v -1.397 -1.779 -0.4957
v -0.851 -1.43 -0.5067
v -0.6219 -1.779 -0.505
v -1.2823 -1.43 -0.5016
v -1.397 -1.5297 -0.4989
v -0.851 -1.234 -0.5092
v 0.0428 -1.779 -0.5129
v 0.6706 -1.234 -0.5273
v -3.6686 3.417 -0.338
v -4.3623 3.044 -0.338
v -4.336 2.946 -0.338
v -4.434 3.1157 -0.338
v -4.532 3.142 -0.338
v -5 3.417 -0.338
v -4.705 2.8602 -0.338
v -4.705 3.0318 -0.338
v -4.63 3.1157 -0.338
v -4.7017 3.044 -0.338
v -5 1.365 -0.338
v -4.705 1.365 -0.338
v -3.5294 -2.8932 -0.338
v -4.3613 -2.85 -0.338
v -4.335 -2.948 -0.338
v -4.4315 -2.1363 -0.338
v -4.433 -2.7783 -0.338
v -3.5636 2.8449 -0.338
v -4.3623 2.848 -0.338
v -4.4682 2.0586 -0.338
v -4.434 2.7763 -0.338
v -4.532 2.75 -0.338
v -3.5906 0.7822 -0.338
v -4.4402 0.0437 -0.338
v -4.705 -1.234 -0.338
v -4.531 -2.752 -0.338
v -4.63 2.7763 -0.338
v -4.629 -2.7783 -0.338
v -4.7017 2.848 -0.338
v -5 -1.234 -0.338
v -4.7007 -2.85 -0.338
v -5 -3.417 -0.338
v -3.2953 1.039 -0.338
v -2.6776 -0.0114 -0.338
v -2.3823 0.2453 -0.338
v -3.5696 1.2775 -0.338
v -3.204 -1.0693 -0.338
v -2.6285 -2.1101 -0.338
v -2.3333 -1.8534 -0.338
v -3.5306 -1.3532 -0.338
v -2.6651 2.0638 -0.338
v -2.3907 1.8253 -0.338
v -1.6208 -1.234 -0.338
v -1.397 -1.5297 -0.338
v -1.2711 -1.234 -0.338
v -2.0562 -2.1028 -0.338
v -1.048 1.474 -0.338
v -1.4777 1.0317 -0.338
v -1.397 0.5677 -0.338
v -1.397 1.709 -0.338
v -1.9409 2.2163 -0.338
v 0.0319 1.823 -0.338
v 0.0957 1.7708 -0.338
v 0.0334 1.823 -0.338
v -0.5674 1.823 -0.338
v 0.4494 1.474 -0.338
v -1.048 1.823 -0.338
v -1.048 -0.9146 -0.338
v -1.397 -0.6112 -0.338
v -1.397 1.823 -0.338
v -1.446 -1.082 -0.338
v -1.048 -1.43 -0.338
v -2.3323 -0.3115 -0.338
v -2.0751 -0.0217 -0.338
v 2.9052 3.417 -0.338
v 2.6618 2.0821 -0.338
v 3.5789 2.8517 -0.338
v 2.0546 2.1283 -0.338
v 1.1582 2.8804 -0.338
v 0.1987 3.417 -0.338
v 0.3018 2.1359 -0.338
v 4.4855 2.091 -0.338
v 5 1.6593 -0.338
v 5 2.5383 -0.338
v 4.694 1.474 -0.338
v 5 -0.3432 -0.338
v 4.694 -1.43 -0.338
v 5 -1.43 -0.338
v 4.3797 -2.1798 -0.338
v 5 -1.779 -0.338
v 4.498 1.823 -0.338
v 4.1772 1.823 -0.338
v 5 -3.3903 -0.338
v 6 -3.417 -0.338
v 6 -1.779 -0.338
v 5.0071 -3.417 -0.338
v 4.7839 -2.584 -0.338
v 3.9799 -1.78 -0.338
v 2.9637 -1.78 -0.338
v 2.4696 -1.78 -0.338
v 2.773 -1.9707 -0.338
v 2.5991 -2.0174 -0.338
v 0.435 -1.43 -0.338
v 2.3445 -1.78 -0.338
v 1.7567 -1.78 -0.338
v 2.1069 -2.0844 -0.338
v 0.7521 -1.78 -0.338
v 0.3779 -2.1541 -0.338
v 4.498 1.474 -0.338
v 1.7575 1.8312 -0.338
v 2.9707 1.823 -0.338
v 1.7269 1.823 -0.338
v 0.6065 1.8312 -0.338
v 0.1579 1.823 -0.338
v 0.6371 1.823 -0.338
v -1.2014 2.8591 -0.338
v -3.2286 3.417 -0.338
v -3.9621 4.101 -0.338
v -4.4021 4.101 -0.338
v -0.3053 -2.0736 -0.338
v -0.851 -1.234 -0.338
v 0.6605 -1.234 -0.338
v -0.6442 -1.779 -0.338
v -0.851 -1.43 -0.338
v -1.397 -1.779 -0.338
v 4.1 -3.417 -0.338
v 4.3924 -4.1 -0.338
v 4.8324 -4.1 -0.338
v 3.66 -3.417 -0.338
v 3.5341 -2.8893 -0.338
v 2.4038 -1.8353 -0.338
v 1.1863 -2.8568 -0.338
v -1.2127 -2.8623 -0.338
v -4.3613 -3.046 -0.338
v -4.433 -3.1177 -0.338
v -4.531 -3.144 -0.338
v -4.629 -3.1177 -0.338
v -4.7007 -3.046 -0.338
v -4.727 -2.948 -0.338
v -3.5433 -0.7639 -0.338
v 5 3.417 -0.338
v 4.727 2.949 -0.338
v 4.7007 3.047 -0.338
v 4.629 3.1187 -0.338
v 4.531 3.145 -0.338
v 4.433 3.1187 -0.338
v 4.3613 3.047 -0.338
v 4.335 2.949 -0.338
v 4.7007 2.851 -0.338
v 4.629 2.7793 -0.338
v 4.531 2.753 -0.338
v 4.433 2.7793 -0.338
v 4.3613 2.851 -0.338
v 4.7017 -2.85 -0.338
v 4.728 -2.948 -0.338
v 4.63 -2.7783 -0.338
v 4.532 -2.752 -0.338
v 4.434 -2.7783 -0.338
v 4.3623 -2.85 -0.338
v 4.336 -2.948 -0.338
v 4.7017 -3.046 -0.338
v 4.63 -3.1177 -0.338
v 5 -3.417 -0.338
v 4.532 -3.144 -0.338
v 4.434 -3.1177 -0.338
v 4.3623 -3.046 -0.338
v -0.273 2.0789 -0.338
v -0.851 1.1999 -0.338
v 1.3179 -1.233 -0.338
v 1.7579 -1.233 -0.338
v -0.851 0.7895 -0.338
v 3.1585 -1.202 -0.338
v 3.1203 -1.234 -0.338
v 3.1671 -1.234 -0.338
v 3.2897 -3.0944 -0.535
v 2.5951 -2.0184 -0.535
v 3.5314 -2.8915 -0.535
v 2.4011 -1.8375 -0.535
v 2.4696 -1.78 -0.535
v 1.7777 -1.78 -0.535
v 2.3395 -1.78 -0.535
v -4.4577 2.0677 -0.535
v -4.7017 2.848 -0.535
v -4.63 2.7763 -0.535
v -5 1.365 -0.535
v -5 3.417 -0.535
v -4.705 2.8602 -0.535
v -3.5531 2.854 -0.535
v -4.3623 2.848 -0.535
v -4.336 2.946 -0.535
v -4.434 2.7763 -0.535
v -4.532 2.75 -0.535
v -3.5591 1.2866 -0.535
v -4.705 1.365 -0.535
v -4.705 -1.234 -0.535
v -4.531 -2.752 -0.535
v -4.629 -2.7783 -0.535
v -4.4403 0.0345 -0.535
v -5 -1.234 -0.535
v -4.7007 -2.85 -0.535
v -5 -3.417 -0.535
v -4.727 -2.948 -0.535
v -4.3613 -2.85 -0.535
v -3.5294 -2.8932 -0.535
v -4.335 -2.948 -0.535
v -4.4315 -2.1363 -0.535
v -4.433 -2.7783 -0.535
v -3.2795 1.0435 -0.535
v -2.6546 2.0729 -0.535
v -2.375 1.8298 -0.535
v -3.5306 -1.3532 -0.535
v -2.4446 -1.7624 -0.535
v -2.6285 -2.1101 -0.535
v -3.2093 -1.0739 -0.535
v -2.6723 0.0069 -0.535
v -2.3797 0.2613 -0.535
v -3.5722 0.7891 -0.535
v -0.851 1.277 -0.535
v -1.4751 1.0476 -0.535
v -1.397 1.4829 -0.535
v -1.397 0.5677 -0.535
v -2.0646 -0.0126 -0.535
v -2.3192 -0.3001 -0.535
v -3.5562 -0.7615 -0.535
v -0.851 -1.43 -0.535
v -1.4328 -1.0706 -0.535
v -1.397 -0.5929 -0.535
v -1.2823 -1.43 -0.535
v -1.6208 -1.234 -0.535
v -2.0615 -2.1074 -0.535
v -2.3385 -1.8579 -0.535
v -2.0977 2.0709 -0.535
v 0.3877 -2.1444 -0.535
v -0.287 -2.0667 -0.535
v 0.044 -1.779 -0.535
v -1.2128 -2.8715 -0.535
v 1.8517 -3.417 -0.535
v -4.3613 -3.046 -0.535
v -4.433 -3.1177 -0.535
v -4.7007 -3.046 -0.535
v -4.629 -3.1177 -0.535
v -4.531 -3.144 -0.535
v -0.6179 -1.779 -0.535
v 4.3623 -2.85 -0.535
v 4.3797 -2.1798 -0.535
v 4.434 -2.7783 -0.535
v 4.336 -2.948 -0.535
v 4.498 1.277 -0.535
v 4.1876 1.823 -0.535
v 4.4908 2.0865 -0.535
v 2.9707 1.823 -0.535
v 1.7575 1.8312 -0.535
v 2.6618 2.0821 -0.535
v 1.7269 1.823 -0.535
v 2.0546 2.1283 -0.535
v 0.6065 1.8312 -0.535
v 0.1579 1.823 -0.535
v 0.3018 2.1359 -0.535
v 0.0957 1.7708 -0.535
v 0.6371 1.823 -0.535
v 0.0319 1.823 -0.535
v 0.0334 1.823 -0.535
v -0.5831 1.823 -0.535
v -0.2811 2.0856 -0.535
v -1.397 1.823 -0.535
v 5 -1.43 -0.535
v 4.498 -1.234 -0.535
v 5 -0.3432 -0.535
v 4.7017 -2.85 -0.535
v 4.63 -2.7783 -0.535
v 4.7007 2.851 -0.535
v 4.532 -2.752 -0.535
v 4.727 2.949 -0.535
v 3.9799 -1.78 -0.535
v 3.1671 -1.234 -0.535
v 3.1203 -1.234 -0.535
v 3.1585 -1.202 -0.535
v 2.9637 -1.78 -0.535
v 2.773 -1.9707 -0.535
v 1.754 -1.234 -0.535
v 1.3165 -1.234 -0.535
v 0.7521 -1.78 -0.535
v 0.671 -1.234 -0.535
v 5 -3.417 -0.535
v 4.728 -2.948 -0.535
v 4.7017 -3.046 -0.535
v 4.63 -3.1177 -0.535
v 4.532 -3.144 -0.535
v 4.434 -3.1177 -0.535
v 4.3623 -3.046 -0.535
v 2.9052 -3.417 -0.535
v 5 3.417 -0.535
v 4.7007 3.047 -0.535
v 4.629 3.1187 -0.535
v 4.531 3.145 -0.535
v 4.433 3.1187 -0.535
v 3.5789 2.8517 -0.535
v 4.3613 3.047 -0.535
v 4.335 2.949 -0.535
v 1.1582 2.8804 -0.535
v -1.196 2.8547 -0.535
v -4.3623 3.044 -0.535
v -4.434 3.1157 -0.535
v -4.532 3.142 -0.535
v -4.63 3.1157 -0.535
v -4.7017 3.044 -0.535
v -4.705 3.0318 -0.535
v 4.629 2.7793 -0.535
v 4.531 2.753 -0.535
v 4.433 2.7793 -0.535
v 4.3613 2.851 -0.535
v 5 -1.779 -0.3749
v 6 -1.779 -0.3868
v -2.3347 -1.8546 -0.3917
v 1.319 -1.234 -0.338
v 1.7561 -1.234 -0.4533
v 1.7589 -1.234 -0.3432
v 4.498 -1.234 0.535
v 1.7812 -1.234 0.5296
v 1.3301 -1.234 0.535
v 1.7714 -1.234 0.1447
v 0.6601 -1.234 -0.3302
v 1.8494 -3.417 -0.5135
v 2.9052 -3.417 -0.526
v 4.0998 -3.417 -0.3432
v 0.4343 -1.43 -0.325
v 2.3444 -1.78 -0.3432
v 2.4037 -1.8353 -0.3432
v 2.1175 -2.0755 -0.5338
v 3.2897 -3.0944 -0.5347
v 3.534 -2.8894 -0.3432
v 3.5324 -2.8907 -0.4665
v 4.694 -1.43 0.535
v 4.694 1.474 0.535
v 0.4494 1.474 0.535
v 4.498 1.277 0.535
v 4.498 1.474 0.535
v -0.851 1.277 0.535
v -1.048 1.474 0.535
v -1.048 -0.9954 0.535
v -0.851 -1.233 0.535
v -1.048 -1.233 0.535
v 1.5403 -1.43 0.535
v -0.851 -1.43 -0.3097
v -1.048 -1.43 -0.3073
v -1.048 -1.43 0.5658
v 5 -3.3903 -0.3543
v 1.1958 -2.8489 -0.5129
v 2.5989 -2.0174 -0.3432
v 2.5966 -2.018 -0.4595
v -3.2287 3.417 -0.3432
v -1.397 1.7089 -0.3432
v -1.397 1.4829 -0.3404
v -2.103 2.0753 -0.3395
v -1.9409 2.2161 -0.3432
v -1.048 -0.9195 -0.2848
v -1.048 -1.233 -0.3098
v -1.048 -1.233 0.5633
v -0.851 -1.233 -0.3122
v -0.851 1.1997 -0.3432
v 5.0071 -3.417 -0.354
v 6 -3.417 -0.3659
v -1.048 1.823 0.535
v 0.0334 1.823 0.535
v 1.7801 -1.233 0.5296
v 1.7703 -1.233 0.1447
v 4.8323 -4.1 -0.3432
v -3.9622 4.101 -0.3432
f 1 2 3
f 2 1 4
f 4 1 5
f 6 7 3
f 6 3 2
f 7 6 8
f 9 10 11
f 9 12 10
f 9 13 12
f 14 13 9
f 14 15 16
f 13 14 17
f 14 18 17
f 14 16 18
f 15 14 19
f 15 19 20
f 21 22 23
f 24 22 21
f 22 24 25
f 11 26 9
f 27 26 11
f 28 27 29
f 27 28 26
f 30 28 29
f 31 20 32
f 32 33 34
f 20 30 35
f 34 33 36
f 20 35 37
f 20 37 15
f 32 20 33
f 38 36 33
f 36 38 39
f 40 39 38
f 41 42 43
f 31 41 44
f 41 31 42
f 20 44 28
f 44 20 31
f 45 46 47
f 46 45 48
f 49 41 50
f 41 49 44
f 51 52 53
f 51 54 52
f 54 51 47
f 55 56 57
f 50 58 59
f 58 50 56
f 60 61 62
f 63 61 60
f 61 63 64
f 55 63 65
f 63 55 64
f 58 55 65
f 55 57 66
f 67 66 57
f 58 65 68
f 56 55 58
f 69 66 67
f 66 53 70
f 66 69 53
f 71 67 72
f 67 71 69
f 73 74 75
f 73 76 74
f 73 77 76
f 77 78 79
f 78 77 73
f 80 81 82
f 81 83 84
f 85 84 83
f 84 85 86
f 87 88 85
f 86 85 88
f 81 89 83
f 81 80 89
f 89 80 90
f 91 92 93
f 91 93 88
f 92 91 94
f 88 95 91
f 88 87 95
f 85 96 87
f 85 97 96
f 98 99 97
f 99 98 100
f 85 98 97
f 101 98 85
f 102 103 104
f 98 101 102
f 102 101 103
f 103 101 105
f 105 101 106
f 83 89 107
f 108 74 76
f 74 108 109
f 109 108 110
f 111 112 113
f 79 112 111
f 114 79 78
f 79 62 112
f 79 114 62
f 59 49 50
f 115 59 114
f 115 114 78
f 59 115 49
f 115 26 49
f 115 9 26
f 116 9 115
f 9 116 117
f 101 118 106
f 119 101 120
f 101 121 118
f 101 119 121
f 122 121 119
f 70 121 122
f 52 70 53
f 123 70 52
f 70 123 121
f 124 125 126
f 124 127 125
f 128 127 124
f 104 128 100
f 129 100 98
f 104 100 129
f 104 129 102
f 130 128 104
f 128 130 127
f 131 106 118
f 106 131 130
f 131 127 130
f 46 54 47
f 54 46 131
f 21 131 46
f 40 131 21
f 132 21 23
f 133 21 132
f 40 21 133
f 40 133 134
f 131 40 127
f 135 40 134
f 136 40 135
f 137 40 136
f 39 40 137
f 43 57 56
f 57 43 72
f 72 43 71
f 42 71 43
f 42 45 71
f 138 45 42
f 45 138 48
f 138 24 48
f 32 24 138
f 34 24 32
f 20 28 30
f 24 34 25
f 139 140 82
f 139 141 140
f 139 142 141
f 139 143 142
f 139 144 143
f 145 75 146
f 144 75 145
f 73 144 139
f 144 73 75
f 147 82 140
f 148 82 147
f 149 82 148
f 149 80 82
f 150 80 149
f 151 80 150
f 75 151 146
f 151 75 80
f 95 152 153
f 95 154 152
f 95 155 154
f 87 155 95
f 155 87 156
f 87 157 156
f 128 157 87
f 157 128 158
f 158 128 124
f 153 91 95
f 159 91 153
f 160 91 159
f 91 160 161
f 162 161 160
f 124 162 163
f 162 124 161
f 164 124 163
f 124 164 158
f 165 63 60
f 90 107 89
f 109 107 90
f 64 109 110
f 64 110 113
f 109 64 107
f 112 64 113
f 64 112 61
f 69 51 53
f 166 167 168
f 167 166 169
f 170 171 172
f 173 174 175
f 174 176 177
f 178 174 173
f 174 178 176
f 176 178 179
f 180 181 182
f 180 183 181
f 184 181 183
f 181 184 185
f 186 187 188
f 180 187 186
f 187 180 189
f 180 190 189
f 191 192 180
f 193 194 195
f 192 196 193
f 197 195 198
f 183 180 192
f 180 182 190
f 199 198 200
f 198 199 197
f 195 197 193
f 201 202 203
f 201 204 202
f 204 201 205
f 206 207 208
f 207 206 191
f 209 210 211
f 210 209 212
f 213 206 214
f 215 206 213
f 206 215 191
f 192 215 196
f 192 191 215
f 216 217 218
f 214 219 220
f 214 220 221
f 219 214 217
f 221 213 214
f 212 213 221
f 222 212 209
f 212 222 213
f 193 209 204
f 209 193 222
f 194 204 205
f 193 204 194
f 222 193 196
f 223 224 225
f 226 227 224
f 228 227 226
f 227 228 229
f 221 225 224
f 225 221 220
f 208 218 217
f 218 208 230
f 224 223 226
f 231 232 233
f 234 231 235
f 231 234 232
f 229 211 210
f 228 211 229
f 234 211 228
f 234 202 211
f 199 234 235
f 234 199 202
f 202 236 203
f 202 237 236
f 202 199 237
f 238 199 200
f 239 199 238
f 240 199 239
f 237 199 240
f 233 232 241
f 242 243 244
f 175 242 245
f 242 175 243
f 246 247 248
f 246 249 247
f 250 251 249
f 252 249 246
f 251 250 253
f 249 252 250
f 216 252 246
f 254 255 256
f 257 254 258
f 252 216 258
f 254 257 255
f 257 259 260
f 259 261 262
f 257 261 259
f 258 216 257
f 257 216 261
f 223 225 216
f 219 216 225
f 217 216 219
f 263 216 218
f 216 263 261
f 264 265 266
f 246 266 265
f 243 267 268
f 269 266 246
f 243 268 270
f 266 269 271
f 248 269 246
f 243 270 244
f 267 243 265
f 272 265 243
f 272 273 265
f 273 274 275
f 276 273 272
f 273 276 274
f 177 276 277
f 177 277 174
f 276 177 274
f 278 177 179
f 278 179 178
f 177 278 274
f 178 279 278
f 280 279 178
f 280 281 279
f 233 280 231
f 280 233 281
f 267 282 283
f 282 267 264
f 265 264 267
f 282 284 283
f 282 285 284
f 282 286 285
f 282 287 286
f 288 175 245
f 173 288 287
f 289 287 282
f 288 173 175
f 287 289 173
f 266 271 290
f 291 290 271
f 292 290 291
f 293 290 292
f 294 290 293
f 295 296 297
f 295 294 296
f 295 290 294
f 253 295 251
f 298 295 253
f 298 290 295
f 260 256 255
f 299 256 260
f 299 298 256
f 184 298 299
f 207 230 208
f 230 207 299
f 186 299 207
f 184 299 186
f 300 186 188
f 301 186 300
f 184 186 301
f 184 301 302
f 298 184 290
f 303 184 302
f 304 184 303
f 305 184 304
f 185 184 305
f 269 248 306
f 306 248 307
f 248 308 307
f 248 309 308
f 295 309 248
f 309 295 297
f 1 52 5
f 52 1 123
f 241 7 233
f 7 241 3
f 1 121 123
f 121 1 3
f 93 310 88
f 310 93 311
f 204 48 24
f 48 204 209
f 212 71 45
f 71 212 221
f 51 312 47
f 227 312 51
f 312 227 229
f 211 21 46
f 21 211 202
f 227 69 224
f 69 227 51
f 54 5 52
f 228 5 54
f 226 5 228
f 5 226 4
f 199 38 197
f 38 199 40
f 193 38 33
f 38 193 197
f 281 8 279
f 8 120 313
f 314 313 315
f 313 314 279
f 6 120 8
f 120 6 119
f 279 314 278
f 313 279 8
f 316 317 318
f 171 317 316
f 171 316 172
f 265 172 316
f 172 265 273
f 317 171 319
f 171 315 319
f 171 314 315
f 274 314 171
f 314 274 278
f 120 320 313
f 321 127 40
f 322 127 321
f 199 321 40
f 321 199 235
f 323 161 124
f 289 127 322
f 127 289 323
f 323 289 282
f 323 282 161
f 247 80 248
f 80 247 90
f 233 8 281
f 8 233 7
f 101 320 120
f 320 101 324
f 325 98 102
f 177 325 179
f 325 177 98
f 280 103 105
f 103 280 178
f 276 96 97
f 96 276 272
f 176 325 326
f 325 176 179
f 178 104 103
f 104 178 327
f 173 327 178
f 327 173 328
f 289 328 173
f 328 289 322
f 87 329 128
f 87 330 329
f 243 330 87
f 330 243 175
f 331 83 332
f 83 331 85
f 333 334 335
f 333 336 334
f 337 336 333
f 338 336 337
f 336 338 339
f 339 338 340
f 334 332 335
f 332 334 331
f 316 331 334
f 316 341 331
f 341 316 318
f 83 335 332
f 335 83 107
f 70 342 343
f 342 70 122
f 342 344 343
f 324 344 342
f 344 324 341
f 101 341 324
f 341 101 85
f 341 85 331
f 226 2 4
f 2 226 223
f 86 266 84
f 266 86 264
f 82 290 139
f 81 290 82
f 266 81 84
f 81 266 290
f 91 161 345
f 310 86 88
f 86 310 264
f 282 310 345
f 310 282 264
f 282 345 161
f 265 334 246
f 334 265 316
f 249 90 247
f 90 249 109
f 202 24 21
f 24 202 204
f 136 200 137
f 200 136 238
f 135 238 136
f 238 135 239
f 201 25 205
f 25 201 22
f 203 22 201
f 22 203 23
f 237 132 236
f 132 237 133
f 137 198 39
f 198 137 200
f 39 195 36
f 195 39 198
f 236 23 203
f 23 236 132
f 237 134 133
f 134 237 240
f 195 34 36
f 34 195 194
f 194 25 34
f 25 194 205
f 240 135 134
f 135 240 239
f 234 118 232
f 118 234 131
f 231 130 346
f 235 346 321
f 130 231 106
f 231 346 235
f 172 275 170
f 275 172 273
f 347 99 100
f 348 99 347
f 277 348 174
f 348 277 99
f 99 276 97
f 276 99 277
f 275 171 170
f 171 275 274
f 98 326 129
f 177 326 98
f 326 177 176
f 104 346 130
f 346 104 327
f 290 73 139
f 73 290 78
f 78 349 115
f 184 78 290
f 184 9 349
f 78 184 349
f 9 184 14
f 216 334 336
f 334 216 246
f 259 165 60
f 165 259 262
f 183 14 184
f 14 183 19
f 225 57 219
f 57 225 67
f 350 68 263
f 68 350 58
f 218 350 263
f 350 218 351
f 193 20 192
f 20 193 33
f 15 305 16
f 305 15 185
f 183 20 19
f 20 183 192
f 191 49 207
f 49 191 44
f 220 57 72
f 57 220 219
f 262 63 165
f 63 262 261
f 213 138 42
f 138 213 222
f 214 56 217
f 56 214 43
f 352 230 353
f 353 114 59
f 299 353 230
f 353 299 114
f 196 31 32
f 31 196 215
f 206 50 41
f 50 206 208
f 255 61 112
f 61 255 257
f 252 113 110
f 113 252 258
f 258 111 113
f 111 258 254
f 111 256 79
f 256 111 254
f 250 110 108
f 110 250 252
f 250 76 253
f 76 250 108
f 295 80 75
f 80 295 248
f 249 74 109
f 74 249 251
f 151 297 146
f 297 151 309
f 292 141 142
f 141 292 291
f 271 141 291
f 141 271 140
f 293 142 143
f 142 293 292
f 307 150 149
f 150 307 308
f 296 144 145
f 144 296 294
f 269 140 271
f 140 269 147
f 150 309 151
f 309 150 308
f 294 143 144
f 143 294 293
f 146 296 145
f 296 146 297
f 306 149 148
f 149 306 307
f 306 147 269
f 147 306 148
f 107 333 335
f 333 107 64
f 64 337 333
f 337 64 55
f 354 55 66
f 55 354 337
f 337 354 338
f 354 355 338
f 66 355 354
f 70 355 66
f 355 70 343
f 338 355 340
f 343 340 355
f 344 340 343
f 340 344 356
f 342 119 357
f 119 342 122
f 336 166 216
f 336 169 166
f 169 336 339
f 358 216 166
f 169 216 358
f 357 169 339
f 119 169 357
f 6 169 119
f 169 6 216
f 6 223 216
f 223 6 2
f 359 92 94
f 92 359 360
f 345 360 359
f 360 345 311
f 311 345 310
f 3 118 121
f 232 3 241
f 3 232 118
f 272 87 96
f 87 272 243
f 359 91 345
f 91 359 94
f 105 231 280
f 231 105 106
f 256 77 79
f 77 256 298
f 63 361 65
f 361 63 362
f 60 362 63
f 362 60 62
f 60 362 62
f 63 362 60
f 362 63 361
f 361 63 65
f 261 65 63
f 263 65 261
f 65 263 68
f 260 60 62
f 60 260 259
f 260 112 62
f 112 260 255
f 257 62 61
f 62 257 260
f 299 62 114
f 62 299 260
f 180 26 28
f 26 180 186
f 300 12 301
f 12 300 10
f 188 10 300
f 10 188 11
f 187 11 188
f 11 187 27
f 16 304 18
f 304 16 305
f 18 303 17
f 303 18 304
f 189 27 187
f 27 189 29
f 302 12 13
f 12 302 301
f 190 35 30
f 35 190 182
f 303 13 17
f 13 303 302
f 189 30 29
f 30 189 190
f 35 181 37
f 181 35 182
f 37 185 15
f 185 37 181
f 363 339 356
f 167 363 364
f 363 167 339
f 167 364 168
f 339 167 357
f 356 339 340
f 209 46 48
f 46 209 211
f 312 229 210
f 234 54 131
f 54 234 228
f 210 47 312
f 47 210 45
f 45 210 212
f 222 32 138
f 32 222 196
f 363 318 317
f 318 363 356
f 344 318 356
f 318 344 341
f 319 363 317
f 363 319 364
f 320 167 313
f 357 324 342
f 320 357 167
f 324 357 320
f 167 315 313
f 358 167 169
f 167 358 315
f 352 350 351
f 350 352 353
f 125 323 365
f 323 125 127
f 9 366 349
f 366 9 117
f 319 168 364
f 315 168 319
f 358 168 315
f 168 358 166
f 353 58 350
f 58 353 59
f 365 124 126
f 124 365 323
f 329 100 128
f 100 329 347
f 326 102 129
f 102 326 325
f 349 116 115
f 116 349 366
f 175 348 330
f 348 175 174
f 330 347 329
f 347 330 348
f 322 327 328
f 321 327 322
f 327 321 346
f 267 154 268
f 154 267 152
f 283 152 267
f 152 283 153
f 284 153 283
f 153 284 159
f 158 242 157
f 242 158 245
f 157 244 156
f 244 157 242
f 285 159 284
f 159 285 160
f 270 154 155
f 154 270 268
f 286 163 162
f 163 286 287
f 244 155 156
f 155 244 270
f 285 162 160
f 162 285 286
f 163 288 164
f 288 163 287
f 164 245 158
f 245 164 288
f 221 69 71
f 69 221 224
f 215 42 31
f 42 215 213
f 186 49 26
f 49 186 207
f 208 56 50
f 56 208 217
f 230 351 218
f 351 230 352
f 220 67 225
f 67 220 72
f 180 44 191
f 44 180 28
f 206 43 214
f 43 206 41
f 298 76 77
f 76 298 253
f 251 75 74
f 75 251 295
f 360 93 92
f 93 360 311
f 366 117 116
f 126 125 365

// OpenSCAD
intersection() {
translate([-6, -4.1, -0.642]) cube(size = [12, 8.201, 1.284], center = false);
union() {
intersection() {
translate([-5, -3.417, -0.535]) cube(size = [23.1, 2.183, 0.197], center = false);
union() {
rotate([-180, 0, 41])
translate([-18.1, -18.1, -0.535]) cube(size = [36.2, 16.805, 18.635], center = false);
intersection() {
rotate([-1, 0, -43])
translate([-18.1, -18.1, -0.535]) cube(size = [36.2, 18.403, 0.197], center = false);
translate([-1.397, -1.779, -0.535]) cube(size = [19.497, 0.546, 0.197], center = false);
}
rotate([-180, 0, 41])
translate([-18.1, -0.132, 0.338]) cube(size = [36.2, 0.37, 17.762], center = false);
}
}
intersection() {
union() {
difference() {
rotate([178, 0, 41])
translate([-18.1, 1.352, -18.1]) cube(size = [36.2, 16.748, 36.2], center = false);
translate([-18.1, -18.1, -18.1]) cube(size = [23.1, 16.32, 18.635], center = false);
}
intersection() {
rotate([-1, 0, -43])
translate([-18.1, -18.1, -18.1]) cube(size = [36.2, 18.403, 17.762], center = false);
rotate([4, 0, -41])
translate([-18.1, -0.214, -18.1]) cube(size = [36.2, 18.313, 36.2], center = false);
}
}
difference() {
union() {
rotate([-180, 0, 40])
translate([-18.1, 0.116, 0.338]) cube(size = [36.2, 4.369, 0.197], center = false);
translate([-18.1, -1.43, -0.535]) cube(size = [22.794, 2.904, 1.07], center = false);
}
union() {
translate([5, -3.417, -0.535]) cube(size = [13.1, 6.834, 1.07], center = false);
translate([-18.1, -1.234, -0.535]) cube(size = [22.598, 3.057, 1.07], center = false);
}
}
}
intersection() {
union() {
rotate([-180, 0, 41])
translate([-18.1, -1.414, 0.338]) cube(size = [36.2, 0.119, 0.197], center = false);
translate([-1.397, -18.1, -0.535]) cube(size = [19.497, 36.2, 0.197], center = false);
difference() {
rotate([0, 0, -40])
translate([-18.1, -18.1, -0.535]) cube(size = [36.2, 13.615, 0.197], center = false);
translate([-4.531, -2.948, -0.535])
cylinder(h = 0.197, r1 = 0.196, r2 = 0.196, center = false, $fn = 12);
}
}
union() {
rotate([178, 0, 41])
translate([-18.1, 1.352, -18.1]) cube(size = [36.2, 16.748, 36.2], center = false);
rotate([-180, 0, 41])
translate([-18.1, -1.414, -0.535]) cube(size = [36.2, 1.283, 1.07], center = false);
}
difference() {
translate([-5, -3.417, -18.1]) cube(size = [23.1, 21.517, 18.635], center = false);
rotate([4, 0, -41])
translate([-18.1, -1.398, -18.1]) cube(size = [36.2, 19.498, 36.2], center = false);
}
}
intersection() {
translate([2.369, -1.271, -0.535])
cylinder(h = 0.197, r1 = 0.808, r2 = 0.808, center = false, $fn = 12);
rotate([-180, 0, 40])
translate([-18.1, 2.951, -18.1]) cube(size = [36.2, 1.534, 18.635], center = false);
}
intersection() {
union() {
translate([-5, 1.277, -0.535]) cube(size = [4.148, 2.14, 0.197], center = false);
intersection() {
translate([-4.705, 1.277, -0.535]) cube(size = [22.805, 2.14, 0.197], center = false);
rotate([0, 0, -40])
translate([-18.1, 0.238, -18.1]) cube(size = [36.2, 1.179, 17.762], center = false);
}
translate([-4.705, -18.1, -0.535]) cube(size = [3.308, 21.517, 0.197], center = false);
}
difference() {
union() {
translate([-5, 1.365, -0.535]) cube(size = [0.295, 2.052, 18.635], center = false);
rotate([-180, 0, 41])
translate([-18.1, -3.306, -0.535]) cube(size = [36.2, 1.961, 1.07], center = false);
}
intersection() {
rotate([-177, 0, 41])
translate([-18.1, -18.1, -18.1]) cube(size = [36.2, 16.372, 36.2], center = false);
rotate([178, 0, 41])
translate([-18.1, -2.956, -18.1]) cube(size = [36.2, 21.056, 36.2], center = false);
}
}
}
difference() {
difference() {
intersection() {
rotate([-180, 0, 40])
translate([-18.1, -1.295, -0.535]) cube(size = [36.2, 5.781, 1.07], center = false);
translate([-18.1, 1.277, -0.535]) cube(size = [23.1, 2.14, 18.635], center = false);
}
intersection() {
translate([-18.1, 1.823, -0.535]) cube(size = [23.1, 1.594, 0.197], center = false);
translate([1.182, 2.828, -0.535])
cylinder(h = 1.07, r1 = 1.151, r2 = 1.151, center = false, $fn = 12);
}
}
union() {
difference() {
rotate([0, 0, -40])
translate([-18.1, 3.306, -18.1]) cube(size = [36.2, 1.179, 18.635], center = false);
translate([-18.1, -3.417, -0.535]) cube(size = [22.598, 5.24, 1.07], center = false);
}
translate([4.531, 2.949, -18.1])
cylinder(h = 36.2, r1 = 0.196, r2 = 0.196, center = false, $fn = 12);
translate([-18.1, 1.474, -0.338]) cube(size = [23.1, 1.943, 18.438], center = false);
}
}
difference() {
translate([-4.705, -1.43, -0.535]) cube(size = [3.854, 19.53, 1.07], center = false);
union() {
translate([-4.705, -3.417, -0.338]) cube(size = [3.657, 21.517, 0.873], center = false);
rotate([-180, 0, 41])
translate([-18.1, -18.1, -0.535]) cube(size = [36.2, 17.968, 1.07], center = false);
}
}
difference() {
difference() {
translate([-4.705, -3.417, -0.535]) cube(size = [22.805, 1.638, 0.197], center = false);
rotate([-1, 0, -43])
translate([-18.1, 0.303, -0.535]) cube(size = [36.2, 17.796, 0.197], center = false);
}
union() {
rotate([5, 0, -41])
translate([-18.1, -18.1, -18.1]) cube(size = [36.2, 16.312, 36.2], center = false);
translate([2.366, -3.98, -18.1])
cylinder(h = 17.762, r1 = 2.792, r2 = 2.792, center = false, $fn = 12);
}
}
intersection() {
union() {
translate([-5, 1.474, -0.535]) cube(size = [23.1, 0.349, 0.197], center = false);
intersection() {
translate([-4.705, -18.1, -0.535]) cube(size = [22.805, 19.574, 1.07], center = false);
rotate([-180, 0, 41])
translate([-18.1, -4.485, -18.1]) cube(size = [36.2, 22.585, 18.635], center = false);
}
difference() {
translate([-4.705, 1.823, -18.1]) cube(size = [22.805, 1.594, 18.635], center = false);
difference() {
translate([1.182, 2.828, -18.1])
cylinder(h = 36.2, r1 = 1.151, r2 = 1.151, center = false, $fn = 12);
rotate([-180, 0, 41])
translate([-18.1, -18.1, 0.338]) cube(size = [36.2, 16.686, 17.762], center = false);
}
}
}
union() {
difference() {
translate([-1.048, 1.277, -0.535]) cube(size = [19.148, 0.546, 18.635], center = false);
rotate([0, 0, -40])
translate([-18.1, 1.418, -0.535]) cube(size = [36.2, 16.682, 18.635], center = false);
}
difference() {
union() {
rotate([0, 0, -40])
translate([-18.1, 1.418, -0.535]) cube(size = [36.2, 1.888, 0.197], center = false);
rotate([-180, 0, 41])
translate([-18.1, -18.1, 0.338]) cube(size = [36.2, 13.615, 0.197], center = false);
}
union() {
translate([-4.532, 2.946, -0.535])
cylinder(h = 18.635, r1 = 0.196, r2 = 0.196, center = false, $fn = 12);
translate([-1.397, -18.1, -0.535]) cube(size = [19.497, 19.923, 0.197], center = false);
}
}
difference() {
rotate([-180, 0, 41])
translate([-18.1, -4.485, 0.338]) cube(size = [36.2, 1.179, 0.197], center = false);
rotate([4, 0, -41])
translate([-18.1, -1.398, -18.1]) cube(size = [36.2, 1.185, 36.2], center = false);
}
}
}
intersection() {
union() {
translate([-1.048, -1.43, -18.1]) cube(size = [19.148, 0.197, 36.2], center = false);
translate([-4.705, -1.234, -0.535]) cube(size = [3.854, 19.334, 0.197], center = false);
rotate([0, 0, -40])
translate([-18.1, -3.306, -0.535]) cube(size = [36.2, 21.406, 0.197], center = false);
rotate([-180, 0, 41])
translate([-18.1, -0.132, 0.338]) cube(size = [36.2, 18.232, 0.197], center = false);
}
union() {
difference() {
translate([-4.705, -3.417, -0.535]) cube(size = [3.657, 21.517, 0.197], center = false);
rotate([-2, 0, -42])
translate([-18.1, -2.925, -18.1]) cube(size = [36.2, 21.025, 36.2], center = false);
}
rotate([-1, 0, -43])
translate([-18.1, -18.1, -0.338]) cube(size = [36.2, 18.403, 0.873], center = false);
}
}
difference() {
intersection() {
translate([-18.1, -3.417, -0.535]) cube(size = [23.1, 1.987, 0.197], center = false);
rotate([-180, 0, 40])
translate([-18.1, 2.951, 0.338]) cube(size = [36.2, 15.149, 0.197], center = false);
}
difference() {
translate([2.366, -3.98, -18.1])
cylinder(h = 17.762, r1 = 2.792, r2 = 2.792, center = false, $fn = 12);
rotate([-1, 0, -43])
translate([-18.1, -18.1, -0.535]) cube(size = [36.2, 18.403, 0.197], center = false);
}
}
difference() {
difference() {
translate([-18.1, -3.417, -0.535]) cube(size = [23.1, 4.891, 1.07], center = false);
translate([4.532, -2.948, -18.1])
cylinder(h = 36.2, r1 = 0.196, r2 = 0.196, center = false, $fn = 12);
}
union() {
rotate([-180, 0, 40])
translate([-18.1, -18.1, 0.338]) cube(size = [36.2, 22.585, 0.197], center = false);
rotate([0, 0, -40])
translate([-18.1, -18.1, -0.338]) cube(size = [36.2, 22.585, 0.873], center = false);
}
}
intersection() {
union() {
intersection() {
rotate([5, 0, -41])
translate([-18.1, -1.788, -18.1]) cube(size = [36.2, 19.888, 36.2], center = false);
translate([-4.705, -18.1, -0.535]) cube(size = [3.657, 21.517, 0.197], center = false);
}
intersection() {
rotate([4, 0, -41])
translate([-18.1, -1.398, -18.1]) cube(size = [36.2, 19.498, 36.2], center = false);
translate([-1.048, -18.1, -0.535]) cube(size = [0.197, 19.574, 1.07], center = false);
}
}
union() {
translate([-1.397, -18.1, -18.1]) cube(size = [19.497, 19.923, 18.635], center = false);
intersection() {
rotate([4, 0, -41])
translate([-18.1, -0.214, -18.1]) cube(size = [36.2, 18.313, 36.2], center = false);
rotate([0, 0, -40])
translate([-18.1, -18.1, -18.1]) cube(size = [36.2, 18.338, 17.762], center = false);
}
rotate([4, 0, -41])
translate([-18.1, -18.1, -18.1]) cube(size = [36.2, 16.702, 36.2], center = false);
}
}
difference() {
intersection() {
translate([-18.1, -18.1, -0.535]) cube(size = [23.1, 21.517, 0.197], center = false);
rotate([0, 0, -40])
translate([-18.1, 2.951, -0.535]) cube(size = [36.2, 1.534, 1.07], center = false);
}
intersection() {
translate([-18.1, -1.234, -0.535]) cube(size = [22.598, 4.651, 1.07], center = false);
rotate([-180, 0, 40])
translate([-18.1, 0.116, 0.338]) cube(size = [36.2, 17.984, 17.762], center = false);
}
}
}
}
